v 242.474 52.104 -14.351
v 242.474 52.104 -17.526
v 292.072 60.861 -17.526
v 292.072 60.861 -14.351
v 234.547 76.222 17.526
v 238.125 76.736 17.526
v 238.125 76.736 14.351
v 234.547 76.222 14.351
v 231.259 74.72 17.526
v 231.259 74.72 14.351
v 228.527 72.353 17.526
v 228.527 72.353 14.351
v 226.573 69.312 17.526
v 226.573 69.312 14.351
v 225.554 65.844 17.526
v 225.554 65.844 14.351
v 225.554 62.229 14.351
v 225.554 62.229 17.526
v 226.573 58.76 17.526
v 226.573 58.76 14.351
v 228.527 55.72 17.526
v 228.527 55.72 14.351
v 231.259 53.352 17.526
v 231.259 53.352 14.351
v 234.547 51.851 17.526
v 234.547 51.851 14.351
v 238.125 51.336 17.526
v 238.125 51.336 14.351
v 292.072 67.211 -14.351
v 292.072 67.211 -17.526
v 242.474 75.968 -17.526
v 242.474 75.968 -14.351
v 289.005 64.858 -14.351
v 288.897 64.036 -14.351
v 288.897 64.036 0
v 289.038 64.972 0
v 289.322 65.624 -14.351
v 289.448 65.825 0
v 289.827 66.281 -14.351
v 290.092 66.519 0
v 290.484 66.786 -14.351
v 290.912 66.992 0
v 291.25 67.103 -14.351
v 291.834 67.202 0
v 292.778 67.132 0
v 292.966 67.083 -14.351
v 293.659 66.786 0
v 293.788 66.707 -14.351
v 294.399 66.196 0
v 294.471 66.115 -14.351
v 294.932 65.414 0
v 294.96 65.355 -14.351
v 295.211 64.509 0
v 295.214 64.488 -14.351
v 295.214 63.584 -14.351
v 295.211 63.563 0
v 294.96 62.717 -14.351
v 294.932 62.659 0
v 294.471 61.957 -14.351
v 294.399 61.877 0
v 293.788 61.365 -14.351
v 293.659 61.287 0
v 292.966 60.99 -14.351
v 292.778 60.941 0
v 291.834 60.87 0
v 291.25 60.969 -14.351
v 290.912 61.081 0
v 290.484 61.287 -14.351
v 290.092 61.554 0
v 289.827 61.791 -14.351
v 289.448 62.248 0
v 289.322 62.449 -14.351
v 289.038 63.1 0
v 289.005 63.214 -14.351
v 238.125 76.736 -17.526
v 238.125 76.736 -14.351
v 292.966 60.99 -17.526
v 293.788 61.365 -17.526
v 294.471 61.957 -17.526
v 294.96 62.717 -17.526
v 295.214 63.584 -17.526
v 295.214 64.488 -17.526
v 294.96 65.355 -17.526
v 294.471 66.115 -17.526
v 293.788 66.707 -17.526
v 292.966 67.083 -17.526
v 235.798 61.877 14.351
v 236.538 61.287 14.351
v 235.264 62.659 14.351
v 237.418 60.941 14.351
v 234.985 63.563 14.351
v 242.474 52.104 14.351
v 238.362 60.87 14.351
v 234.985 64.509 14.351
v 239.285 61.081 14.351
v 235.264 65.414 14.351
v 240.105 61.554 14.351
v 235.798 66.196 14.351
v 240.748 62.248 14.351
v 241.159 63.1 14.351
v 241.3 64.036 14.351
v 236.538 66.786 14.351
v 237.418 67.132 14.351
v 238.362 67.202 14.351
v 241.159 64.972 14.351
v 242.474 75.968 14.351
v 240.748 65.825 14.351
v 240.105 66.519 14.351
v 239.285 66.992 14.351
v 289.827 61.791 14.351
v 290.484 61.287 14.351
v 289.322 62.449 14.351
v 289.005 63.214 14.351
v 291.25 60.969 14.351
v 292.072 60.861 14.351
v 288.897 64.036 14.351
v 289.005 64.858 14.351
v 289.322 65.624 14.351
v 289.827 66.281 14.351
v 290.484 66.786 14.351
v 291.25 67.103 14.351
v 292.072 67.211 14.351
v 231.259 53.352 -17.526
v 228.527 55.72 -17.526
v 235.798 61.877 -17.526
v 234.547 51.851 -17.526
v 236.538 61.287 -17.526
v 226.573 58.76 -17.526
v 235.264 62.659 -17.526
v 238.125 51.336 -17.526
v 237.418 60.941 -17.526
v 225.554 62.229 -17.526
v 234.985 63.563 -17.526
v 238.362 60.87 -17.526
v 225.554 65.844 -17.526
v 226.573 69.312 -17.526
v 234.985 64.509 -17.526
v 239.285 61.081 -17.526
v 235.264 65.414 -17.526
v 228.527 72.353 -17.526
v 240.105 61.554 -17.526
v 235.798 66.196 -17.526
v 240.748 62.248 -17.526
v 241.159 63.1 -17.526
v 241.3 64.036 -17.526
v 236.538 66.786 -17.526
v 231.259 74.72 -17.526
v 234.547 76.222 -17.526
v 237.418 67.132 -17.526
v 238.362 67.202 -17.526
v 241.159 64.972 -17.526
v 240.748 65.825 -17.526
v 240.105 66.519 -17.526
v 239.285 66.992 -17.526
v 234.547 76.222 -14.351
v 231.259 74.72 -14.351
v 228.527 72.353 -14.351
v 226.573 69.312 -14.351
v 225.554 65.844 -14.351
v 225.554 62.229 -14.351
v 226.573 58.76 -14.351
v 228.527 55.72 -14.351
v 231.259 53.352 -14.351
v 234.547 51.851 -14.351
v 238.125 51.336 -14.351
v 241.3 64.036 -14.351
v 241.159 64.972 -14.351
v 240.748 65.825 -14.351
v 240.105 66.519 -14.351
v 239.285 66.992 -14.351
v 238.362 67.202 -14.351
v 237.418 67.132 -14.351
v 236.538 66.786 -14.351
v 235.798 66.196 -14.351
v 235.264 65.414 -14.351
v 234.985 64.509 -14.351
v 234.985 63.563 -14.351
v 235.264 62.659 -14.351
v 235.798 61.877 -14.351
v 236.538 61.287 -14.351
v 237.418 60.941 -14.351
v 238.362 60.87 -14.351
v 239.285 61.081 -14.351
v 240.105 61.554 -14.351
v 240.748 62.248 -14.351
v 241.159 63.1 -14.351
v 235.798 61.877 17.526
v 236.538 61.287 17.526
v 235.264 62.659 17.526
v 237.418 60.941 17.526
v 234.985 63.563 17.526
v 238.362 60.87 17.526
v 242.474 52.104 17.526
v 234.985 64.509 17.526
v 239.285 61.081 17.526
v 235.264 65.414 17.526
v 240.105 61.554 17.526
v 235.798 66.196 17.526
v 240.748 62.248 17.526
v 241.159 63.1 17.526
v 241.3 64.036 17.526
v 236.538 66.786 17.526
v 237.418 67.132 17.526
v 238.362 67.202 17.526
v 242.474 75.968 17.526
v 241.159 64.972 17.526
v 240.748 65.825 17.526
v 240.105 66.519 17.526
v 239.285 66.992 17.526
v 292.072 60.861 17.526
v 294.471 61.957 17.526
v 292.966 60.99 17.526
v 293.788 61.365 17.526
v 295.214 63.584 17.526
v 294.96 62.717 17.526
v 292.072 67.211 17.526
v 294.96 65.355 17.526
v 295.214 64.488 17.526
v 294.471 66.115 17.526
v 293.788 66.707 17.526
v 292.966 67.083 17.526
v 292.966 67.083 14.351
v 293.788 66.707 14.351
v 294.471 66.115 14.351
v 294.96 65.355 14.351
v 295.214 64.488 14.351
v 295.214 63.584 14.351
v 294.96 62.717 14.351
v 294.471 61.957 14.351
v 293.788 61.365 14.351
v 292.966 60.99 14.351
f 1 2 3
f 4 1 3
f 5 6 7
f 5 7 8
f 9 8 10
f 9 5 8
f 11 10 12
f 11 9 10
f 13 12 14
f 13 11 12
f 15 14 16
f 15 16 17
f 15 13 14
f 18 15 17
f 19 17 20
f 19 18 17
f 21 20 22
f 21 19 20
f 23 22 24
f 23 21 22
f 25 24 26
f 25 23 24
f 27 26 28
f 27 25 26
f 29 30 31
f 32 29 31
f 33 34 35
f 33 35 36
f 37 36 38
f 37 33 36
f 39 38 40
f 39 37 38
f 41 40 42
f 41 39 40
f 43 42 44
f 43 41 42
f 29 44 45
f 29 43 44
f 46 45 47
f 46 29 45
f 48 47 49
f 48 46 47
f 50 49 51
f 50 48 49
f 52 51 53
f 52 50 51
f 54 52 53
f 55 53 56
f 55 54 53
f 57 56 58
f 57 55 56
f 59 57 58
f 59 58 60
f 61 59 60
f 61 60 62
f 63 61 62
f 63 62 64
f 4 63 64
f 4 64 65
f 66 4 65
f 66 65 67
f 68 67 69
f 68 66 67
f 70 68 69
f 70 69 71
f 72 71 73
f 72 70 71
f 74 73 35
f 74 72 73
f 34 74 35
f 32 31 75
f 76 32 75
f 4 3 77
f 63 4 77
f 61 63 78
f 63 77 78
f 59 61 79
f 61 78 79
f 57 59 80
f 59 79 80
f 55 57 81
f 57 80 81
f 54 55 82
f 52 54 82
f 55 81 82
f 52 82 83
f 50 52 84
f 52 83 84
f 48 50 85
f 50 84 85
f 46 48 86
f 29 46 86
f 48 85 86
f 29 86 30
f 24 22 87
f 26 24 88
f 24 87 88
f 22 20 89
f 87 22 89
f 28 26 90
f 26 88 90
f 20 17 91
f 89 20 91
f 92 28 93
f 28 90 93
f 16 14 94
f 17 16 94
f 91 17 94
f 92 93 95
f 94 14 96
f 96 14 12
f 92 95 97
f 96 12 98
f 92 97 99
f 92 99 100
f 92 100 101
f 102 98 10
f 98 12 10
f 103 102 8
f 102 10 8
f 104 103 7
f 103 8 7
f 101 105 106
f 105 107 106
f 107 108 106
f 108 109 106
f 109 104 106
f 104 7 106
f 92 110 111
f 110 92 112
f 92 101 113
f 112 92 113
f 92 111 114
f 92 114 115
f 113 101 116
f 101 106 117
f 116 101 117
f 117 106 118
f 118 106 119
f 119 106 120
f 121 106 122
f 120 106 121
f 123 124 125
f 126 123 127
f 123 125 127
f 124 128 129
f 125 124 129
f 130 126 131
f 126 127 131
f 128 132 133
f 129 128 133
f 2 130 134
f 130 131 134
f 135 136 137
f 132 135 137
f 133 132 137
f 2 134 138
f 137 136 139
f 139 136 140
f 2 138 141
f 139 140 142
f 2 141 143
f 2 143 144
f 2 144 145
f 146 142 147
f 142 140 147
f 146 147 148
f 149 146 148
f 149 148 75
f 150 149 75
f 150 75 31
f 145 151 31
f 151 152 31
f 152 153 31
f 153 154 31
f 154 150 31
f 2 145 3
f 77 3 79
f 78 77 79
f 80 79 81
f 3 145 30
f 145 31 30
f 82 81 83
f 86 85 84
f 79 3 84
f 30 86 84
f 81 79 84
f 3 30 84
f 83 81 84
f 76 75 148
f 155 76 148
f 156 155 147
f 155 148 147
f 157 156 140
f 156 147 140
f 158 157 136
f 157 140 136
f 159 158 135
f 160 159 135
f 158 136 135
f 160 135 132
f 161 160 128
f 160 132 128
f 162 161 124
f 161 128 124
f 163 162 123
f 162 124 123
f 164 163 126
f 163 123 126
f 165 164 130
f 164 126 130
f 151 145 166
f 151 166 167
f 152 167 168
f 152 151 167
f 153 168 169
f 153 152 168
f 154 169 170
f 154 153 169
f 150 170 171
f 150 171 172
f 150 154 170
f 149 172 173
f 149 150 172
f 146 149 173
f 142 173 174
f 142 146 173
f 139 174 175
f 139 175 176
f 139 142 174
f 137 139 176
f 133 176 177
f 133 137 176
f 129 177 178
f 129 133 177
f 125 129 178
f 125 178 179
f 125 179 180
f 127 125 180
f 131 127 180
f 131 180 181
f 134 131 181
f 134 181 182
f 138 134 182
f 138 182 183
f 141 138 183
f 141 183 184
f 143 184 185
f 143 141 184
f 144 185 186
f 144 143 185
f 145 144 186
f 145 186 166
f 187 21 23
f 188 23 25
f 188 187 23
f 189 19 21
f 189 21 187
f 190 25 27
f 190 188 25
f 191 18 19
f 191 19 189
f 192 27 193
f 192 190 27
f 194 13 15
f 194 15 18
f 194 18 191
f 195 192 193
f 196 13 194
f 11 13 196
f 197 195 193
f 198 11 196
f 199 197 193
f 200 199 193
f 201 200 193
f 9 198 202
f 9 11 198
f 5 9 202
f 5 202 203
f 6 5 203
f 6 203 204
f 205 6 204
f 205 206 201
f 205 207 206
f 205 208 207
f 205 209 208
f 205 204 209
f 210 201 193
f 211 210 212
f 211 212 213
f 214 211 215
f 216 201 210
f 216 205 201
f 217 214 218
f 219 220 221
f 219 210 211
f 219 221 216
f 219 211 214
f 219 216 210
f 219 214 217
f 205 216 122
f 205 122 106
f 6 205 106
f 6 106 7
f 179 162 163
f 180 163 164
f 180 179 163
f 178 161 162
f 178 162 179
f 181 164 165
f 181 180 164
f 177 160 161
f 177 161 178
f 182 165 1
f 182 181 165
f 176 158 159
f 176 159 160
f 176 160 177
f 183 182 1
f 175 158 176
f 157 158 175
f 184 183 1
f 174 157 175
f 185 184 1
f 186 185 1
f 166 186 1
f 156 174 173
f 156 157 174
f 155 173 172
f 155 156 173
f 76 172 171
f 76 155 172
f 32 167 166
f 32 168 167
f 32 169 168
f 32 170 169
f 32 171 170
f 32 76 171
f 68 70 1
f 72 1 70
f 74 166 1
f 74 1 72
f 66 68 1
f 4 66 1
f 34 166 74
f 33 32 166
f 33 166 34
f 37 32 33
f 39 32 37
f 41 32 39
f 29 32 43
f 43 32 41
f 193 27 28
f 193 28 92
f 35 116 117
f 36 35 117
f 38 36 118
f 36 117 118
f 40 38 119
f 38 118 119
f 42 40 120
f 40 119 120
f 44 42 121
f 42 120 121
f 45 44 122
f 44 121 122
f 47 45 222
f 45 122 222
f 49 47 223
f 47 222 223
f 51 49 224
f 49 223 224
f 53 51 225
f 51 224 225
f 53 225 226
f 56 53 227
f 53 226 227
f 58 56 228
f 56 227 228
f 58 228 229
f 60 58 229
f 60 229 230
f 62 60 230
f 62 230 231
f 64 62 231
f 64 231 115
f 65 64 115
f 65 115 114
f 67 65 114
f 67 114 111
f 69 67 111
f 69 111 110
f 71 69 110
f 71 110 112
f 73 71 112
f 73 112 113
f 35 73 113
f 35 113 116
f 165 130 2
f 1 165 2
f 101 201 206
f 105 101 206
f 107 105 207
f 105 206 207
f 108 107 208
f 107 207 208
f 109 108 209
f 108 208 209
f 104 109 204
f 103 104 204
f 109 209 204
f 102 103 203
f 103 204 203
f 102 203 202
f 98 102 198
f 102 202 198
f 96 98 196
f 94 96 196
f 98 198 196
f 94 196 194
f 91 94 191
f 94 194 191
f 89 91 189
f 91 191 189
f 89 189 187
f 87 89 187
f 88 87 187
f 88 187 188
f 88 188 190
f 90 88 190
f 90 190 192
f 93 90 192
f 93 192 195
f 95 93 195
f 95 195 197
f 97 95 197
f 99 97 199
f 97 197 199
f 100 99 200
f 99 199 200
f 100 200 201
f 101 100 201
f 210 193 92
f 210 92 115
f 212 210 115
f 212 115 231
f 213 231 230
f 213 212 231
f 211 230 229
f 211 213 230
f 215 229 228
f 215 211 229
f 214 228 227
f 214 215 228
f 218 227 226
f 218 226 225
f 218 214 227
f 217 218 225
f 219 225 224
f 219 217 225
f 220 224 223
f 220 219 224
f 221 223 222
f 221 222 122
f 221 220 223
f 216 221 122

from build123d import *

# Parameters (mm, degrees)
SKETCH2_R           = 3.175
BOSS_EXTRUDE1_DEPTH = 3.175
SKETCH3_R           = 3.175
BOSS_EXTRUDE2_DEPTH = 14.351


with BuildPart() as part:
    # Sketch2 → Boss-Extrude1 (new body)
    with BuildSketch(Plane.XY.offset(17.526)):
        with BuildLine():
            ThreePointArc((238.125, 76.736249645), (225.425, 64.036249645), (238.125, 51.336249645))
            Line((238.125, 51.336249645), (242.474118596, 52.104143065))
            ThreePointArc((242.474118596, 52.104143065), (248.529898033, 56.754210308), (250.825, 64.036249645))
            ThreePointArc((250.825, 64.036249645), (248.529898033, 71.318288983), (242.474118596, 75.968356225))
            Line((242.474118596, 75.968356225), (238.125, 76.736249645))
        make_face()
        with Locations((238.125, 64.036249645)):
            Circle(SKETCH2_R, mode=Mode.SUBTRACT)
        with BuildLine():
            ThreePointArc((250.825, 64.036249645), (248.529898033, 56.754210308), (242.474118596, 52.104143065))
            Line((242.474118596, 52.104143065), (292.071750355, 60.861249645))
            ThreePointArc((292.071750355, 60.861249645), (288.896750355, 64.036249645), (292.071750355, 67.211249645))
            Line((292.071750355, 67.211249645), (242.474118596, 75.968356225))
            ThreePointArc((242.474118596, 75.968356225), (248.529898033, 71.318288983), (250.825, 64.036249645))
        make_face()
        with Locations((292.071750355, 64.036249645)):
            Circle(SKETCH2_R)
    boss_extrude1 = extrude(amount=-BOSS_EXTRUDE1_DEPTH)

    # Sketch3 → Boss-Extrude2 (add)
    with BuildSketch(Plane(origin=(0, 0, 14.351), x_dir=(-1, 0, 0), z_dir=(0, 0, -1))):
        with Locations((-292.071750355, 64.036249645)):
            Circle(SKETCH3_R)
    boss_extrude2 = extrude(amount=BOSS_EXTRUDE2_DEPTH)

    # Mirror1: Boss-Extrude1, Boss-Extrude2 across plane
    add(boss_extrude1.mirror(Plane.XY))
    add(boss_extrude2.mirror(Plane.XY))


solid = part.part
